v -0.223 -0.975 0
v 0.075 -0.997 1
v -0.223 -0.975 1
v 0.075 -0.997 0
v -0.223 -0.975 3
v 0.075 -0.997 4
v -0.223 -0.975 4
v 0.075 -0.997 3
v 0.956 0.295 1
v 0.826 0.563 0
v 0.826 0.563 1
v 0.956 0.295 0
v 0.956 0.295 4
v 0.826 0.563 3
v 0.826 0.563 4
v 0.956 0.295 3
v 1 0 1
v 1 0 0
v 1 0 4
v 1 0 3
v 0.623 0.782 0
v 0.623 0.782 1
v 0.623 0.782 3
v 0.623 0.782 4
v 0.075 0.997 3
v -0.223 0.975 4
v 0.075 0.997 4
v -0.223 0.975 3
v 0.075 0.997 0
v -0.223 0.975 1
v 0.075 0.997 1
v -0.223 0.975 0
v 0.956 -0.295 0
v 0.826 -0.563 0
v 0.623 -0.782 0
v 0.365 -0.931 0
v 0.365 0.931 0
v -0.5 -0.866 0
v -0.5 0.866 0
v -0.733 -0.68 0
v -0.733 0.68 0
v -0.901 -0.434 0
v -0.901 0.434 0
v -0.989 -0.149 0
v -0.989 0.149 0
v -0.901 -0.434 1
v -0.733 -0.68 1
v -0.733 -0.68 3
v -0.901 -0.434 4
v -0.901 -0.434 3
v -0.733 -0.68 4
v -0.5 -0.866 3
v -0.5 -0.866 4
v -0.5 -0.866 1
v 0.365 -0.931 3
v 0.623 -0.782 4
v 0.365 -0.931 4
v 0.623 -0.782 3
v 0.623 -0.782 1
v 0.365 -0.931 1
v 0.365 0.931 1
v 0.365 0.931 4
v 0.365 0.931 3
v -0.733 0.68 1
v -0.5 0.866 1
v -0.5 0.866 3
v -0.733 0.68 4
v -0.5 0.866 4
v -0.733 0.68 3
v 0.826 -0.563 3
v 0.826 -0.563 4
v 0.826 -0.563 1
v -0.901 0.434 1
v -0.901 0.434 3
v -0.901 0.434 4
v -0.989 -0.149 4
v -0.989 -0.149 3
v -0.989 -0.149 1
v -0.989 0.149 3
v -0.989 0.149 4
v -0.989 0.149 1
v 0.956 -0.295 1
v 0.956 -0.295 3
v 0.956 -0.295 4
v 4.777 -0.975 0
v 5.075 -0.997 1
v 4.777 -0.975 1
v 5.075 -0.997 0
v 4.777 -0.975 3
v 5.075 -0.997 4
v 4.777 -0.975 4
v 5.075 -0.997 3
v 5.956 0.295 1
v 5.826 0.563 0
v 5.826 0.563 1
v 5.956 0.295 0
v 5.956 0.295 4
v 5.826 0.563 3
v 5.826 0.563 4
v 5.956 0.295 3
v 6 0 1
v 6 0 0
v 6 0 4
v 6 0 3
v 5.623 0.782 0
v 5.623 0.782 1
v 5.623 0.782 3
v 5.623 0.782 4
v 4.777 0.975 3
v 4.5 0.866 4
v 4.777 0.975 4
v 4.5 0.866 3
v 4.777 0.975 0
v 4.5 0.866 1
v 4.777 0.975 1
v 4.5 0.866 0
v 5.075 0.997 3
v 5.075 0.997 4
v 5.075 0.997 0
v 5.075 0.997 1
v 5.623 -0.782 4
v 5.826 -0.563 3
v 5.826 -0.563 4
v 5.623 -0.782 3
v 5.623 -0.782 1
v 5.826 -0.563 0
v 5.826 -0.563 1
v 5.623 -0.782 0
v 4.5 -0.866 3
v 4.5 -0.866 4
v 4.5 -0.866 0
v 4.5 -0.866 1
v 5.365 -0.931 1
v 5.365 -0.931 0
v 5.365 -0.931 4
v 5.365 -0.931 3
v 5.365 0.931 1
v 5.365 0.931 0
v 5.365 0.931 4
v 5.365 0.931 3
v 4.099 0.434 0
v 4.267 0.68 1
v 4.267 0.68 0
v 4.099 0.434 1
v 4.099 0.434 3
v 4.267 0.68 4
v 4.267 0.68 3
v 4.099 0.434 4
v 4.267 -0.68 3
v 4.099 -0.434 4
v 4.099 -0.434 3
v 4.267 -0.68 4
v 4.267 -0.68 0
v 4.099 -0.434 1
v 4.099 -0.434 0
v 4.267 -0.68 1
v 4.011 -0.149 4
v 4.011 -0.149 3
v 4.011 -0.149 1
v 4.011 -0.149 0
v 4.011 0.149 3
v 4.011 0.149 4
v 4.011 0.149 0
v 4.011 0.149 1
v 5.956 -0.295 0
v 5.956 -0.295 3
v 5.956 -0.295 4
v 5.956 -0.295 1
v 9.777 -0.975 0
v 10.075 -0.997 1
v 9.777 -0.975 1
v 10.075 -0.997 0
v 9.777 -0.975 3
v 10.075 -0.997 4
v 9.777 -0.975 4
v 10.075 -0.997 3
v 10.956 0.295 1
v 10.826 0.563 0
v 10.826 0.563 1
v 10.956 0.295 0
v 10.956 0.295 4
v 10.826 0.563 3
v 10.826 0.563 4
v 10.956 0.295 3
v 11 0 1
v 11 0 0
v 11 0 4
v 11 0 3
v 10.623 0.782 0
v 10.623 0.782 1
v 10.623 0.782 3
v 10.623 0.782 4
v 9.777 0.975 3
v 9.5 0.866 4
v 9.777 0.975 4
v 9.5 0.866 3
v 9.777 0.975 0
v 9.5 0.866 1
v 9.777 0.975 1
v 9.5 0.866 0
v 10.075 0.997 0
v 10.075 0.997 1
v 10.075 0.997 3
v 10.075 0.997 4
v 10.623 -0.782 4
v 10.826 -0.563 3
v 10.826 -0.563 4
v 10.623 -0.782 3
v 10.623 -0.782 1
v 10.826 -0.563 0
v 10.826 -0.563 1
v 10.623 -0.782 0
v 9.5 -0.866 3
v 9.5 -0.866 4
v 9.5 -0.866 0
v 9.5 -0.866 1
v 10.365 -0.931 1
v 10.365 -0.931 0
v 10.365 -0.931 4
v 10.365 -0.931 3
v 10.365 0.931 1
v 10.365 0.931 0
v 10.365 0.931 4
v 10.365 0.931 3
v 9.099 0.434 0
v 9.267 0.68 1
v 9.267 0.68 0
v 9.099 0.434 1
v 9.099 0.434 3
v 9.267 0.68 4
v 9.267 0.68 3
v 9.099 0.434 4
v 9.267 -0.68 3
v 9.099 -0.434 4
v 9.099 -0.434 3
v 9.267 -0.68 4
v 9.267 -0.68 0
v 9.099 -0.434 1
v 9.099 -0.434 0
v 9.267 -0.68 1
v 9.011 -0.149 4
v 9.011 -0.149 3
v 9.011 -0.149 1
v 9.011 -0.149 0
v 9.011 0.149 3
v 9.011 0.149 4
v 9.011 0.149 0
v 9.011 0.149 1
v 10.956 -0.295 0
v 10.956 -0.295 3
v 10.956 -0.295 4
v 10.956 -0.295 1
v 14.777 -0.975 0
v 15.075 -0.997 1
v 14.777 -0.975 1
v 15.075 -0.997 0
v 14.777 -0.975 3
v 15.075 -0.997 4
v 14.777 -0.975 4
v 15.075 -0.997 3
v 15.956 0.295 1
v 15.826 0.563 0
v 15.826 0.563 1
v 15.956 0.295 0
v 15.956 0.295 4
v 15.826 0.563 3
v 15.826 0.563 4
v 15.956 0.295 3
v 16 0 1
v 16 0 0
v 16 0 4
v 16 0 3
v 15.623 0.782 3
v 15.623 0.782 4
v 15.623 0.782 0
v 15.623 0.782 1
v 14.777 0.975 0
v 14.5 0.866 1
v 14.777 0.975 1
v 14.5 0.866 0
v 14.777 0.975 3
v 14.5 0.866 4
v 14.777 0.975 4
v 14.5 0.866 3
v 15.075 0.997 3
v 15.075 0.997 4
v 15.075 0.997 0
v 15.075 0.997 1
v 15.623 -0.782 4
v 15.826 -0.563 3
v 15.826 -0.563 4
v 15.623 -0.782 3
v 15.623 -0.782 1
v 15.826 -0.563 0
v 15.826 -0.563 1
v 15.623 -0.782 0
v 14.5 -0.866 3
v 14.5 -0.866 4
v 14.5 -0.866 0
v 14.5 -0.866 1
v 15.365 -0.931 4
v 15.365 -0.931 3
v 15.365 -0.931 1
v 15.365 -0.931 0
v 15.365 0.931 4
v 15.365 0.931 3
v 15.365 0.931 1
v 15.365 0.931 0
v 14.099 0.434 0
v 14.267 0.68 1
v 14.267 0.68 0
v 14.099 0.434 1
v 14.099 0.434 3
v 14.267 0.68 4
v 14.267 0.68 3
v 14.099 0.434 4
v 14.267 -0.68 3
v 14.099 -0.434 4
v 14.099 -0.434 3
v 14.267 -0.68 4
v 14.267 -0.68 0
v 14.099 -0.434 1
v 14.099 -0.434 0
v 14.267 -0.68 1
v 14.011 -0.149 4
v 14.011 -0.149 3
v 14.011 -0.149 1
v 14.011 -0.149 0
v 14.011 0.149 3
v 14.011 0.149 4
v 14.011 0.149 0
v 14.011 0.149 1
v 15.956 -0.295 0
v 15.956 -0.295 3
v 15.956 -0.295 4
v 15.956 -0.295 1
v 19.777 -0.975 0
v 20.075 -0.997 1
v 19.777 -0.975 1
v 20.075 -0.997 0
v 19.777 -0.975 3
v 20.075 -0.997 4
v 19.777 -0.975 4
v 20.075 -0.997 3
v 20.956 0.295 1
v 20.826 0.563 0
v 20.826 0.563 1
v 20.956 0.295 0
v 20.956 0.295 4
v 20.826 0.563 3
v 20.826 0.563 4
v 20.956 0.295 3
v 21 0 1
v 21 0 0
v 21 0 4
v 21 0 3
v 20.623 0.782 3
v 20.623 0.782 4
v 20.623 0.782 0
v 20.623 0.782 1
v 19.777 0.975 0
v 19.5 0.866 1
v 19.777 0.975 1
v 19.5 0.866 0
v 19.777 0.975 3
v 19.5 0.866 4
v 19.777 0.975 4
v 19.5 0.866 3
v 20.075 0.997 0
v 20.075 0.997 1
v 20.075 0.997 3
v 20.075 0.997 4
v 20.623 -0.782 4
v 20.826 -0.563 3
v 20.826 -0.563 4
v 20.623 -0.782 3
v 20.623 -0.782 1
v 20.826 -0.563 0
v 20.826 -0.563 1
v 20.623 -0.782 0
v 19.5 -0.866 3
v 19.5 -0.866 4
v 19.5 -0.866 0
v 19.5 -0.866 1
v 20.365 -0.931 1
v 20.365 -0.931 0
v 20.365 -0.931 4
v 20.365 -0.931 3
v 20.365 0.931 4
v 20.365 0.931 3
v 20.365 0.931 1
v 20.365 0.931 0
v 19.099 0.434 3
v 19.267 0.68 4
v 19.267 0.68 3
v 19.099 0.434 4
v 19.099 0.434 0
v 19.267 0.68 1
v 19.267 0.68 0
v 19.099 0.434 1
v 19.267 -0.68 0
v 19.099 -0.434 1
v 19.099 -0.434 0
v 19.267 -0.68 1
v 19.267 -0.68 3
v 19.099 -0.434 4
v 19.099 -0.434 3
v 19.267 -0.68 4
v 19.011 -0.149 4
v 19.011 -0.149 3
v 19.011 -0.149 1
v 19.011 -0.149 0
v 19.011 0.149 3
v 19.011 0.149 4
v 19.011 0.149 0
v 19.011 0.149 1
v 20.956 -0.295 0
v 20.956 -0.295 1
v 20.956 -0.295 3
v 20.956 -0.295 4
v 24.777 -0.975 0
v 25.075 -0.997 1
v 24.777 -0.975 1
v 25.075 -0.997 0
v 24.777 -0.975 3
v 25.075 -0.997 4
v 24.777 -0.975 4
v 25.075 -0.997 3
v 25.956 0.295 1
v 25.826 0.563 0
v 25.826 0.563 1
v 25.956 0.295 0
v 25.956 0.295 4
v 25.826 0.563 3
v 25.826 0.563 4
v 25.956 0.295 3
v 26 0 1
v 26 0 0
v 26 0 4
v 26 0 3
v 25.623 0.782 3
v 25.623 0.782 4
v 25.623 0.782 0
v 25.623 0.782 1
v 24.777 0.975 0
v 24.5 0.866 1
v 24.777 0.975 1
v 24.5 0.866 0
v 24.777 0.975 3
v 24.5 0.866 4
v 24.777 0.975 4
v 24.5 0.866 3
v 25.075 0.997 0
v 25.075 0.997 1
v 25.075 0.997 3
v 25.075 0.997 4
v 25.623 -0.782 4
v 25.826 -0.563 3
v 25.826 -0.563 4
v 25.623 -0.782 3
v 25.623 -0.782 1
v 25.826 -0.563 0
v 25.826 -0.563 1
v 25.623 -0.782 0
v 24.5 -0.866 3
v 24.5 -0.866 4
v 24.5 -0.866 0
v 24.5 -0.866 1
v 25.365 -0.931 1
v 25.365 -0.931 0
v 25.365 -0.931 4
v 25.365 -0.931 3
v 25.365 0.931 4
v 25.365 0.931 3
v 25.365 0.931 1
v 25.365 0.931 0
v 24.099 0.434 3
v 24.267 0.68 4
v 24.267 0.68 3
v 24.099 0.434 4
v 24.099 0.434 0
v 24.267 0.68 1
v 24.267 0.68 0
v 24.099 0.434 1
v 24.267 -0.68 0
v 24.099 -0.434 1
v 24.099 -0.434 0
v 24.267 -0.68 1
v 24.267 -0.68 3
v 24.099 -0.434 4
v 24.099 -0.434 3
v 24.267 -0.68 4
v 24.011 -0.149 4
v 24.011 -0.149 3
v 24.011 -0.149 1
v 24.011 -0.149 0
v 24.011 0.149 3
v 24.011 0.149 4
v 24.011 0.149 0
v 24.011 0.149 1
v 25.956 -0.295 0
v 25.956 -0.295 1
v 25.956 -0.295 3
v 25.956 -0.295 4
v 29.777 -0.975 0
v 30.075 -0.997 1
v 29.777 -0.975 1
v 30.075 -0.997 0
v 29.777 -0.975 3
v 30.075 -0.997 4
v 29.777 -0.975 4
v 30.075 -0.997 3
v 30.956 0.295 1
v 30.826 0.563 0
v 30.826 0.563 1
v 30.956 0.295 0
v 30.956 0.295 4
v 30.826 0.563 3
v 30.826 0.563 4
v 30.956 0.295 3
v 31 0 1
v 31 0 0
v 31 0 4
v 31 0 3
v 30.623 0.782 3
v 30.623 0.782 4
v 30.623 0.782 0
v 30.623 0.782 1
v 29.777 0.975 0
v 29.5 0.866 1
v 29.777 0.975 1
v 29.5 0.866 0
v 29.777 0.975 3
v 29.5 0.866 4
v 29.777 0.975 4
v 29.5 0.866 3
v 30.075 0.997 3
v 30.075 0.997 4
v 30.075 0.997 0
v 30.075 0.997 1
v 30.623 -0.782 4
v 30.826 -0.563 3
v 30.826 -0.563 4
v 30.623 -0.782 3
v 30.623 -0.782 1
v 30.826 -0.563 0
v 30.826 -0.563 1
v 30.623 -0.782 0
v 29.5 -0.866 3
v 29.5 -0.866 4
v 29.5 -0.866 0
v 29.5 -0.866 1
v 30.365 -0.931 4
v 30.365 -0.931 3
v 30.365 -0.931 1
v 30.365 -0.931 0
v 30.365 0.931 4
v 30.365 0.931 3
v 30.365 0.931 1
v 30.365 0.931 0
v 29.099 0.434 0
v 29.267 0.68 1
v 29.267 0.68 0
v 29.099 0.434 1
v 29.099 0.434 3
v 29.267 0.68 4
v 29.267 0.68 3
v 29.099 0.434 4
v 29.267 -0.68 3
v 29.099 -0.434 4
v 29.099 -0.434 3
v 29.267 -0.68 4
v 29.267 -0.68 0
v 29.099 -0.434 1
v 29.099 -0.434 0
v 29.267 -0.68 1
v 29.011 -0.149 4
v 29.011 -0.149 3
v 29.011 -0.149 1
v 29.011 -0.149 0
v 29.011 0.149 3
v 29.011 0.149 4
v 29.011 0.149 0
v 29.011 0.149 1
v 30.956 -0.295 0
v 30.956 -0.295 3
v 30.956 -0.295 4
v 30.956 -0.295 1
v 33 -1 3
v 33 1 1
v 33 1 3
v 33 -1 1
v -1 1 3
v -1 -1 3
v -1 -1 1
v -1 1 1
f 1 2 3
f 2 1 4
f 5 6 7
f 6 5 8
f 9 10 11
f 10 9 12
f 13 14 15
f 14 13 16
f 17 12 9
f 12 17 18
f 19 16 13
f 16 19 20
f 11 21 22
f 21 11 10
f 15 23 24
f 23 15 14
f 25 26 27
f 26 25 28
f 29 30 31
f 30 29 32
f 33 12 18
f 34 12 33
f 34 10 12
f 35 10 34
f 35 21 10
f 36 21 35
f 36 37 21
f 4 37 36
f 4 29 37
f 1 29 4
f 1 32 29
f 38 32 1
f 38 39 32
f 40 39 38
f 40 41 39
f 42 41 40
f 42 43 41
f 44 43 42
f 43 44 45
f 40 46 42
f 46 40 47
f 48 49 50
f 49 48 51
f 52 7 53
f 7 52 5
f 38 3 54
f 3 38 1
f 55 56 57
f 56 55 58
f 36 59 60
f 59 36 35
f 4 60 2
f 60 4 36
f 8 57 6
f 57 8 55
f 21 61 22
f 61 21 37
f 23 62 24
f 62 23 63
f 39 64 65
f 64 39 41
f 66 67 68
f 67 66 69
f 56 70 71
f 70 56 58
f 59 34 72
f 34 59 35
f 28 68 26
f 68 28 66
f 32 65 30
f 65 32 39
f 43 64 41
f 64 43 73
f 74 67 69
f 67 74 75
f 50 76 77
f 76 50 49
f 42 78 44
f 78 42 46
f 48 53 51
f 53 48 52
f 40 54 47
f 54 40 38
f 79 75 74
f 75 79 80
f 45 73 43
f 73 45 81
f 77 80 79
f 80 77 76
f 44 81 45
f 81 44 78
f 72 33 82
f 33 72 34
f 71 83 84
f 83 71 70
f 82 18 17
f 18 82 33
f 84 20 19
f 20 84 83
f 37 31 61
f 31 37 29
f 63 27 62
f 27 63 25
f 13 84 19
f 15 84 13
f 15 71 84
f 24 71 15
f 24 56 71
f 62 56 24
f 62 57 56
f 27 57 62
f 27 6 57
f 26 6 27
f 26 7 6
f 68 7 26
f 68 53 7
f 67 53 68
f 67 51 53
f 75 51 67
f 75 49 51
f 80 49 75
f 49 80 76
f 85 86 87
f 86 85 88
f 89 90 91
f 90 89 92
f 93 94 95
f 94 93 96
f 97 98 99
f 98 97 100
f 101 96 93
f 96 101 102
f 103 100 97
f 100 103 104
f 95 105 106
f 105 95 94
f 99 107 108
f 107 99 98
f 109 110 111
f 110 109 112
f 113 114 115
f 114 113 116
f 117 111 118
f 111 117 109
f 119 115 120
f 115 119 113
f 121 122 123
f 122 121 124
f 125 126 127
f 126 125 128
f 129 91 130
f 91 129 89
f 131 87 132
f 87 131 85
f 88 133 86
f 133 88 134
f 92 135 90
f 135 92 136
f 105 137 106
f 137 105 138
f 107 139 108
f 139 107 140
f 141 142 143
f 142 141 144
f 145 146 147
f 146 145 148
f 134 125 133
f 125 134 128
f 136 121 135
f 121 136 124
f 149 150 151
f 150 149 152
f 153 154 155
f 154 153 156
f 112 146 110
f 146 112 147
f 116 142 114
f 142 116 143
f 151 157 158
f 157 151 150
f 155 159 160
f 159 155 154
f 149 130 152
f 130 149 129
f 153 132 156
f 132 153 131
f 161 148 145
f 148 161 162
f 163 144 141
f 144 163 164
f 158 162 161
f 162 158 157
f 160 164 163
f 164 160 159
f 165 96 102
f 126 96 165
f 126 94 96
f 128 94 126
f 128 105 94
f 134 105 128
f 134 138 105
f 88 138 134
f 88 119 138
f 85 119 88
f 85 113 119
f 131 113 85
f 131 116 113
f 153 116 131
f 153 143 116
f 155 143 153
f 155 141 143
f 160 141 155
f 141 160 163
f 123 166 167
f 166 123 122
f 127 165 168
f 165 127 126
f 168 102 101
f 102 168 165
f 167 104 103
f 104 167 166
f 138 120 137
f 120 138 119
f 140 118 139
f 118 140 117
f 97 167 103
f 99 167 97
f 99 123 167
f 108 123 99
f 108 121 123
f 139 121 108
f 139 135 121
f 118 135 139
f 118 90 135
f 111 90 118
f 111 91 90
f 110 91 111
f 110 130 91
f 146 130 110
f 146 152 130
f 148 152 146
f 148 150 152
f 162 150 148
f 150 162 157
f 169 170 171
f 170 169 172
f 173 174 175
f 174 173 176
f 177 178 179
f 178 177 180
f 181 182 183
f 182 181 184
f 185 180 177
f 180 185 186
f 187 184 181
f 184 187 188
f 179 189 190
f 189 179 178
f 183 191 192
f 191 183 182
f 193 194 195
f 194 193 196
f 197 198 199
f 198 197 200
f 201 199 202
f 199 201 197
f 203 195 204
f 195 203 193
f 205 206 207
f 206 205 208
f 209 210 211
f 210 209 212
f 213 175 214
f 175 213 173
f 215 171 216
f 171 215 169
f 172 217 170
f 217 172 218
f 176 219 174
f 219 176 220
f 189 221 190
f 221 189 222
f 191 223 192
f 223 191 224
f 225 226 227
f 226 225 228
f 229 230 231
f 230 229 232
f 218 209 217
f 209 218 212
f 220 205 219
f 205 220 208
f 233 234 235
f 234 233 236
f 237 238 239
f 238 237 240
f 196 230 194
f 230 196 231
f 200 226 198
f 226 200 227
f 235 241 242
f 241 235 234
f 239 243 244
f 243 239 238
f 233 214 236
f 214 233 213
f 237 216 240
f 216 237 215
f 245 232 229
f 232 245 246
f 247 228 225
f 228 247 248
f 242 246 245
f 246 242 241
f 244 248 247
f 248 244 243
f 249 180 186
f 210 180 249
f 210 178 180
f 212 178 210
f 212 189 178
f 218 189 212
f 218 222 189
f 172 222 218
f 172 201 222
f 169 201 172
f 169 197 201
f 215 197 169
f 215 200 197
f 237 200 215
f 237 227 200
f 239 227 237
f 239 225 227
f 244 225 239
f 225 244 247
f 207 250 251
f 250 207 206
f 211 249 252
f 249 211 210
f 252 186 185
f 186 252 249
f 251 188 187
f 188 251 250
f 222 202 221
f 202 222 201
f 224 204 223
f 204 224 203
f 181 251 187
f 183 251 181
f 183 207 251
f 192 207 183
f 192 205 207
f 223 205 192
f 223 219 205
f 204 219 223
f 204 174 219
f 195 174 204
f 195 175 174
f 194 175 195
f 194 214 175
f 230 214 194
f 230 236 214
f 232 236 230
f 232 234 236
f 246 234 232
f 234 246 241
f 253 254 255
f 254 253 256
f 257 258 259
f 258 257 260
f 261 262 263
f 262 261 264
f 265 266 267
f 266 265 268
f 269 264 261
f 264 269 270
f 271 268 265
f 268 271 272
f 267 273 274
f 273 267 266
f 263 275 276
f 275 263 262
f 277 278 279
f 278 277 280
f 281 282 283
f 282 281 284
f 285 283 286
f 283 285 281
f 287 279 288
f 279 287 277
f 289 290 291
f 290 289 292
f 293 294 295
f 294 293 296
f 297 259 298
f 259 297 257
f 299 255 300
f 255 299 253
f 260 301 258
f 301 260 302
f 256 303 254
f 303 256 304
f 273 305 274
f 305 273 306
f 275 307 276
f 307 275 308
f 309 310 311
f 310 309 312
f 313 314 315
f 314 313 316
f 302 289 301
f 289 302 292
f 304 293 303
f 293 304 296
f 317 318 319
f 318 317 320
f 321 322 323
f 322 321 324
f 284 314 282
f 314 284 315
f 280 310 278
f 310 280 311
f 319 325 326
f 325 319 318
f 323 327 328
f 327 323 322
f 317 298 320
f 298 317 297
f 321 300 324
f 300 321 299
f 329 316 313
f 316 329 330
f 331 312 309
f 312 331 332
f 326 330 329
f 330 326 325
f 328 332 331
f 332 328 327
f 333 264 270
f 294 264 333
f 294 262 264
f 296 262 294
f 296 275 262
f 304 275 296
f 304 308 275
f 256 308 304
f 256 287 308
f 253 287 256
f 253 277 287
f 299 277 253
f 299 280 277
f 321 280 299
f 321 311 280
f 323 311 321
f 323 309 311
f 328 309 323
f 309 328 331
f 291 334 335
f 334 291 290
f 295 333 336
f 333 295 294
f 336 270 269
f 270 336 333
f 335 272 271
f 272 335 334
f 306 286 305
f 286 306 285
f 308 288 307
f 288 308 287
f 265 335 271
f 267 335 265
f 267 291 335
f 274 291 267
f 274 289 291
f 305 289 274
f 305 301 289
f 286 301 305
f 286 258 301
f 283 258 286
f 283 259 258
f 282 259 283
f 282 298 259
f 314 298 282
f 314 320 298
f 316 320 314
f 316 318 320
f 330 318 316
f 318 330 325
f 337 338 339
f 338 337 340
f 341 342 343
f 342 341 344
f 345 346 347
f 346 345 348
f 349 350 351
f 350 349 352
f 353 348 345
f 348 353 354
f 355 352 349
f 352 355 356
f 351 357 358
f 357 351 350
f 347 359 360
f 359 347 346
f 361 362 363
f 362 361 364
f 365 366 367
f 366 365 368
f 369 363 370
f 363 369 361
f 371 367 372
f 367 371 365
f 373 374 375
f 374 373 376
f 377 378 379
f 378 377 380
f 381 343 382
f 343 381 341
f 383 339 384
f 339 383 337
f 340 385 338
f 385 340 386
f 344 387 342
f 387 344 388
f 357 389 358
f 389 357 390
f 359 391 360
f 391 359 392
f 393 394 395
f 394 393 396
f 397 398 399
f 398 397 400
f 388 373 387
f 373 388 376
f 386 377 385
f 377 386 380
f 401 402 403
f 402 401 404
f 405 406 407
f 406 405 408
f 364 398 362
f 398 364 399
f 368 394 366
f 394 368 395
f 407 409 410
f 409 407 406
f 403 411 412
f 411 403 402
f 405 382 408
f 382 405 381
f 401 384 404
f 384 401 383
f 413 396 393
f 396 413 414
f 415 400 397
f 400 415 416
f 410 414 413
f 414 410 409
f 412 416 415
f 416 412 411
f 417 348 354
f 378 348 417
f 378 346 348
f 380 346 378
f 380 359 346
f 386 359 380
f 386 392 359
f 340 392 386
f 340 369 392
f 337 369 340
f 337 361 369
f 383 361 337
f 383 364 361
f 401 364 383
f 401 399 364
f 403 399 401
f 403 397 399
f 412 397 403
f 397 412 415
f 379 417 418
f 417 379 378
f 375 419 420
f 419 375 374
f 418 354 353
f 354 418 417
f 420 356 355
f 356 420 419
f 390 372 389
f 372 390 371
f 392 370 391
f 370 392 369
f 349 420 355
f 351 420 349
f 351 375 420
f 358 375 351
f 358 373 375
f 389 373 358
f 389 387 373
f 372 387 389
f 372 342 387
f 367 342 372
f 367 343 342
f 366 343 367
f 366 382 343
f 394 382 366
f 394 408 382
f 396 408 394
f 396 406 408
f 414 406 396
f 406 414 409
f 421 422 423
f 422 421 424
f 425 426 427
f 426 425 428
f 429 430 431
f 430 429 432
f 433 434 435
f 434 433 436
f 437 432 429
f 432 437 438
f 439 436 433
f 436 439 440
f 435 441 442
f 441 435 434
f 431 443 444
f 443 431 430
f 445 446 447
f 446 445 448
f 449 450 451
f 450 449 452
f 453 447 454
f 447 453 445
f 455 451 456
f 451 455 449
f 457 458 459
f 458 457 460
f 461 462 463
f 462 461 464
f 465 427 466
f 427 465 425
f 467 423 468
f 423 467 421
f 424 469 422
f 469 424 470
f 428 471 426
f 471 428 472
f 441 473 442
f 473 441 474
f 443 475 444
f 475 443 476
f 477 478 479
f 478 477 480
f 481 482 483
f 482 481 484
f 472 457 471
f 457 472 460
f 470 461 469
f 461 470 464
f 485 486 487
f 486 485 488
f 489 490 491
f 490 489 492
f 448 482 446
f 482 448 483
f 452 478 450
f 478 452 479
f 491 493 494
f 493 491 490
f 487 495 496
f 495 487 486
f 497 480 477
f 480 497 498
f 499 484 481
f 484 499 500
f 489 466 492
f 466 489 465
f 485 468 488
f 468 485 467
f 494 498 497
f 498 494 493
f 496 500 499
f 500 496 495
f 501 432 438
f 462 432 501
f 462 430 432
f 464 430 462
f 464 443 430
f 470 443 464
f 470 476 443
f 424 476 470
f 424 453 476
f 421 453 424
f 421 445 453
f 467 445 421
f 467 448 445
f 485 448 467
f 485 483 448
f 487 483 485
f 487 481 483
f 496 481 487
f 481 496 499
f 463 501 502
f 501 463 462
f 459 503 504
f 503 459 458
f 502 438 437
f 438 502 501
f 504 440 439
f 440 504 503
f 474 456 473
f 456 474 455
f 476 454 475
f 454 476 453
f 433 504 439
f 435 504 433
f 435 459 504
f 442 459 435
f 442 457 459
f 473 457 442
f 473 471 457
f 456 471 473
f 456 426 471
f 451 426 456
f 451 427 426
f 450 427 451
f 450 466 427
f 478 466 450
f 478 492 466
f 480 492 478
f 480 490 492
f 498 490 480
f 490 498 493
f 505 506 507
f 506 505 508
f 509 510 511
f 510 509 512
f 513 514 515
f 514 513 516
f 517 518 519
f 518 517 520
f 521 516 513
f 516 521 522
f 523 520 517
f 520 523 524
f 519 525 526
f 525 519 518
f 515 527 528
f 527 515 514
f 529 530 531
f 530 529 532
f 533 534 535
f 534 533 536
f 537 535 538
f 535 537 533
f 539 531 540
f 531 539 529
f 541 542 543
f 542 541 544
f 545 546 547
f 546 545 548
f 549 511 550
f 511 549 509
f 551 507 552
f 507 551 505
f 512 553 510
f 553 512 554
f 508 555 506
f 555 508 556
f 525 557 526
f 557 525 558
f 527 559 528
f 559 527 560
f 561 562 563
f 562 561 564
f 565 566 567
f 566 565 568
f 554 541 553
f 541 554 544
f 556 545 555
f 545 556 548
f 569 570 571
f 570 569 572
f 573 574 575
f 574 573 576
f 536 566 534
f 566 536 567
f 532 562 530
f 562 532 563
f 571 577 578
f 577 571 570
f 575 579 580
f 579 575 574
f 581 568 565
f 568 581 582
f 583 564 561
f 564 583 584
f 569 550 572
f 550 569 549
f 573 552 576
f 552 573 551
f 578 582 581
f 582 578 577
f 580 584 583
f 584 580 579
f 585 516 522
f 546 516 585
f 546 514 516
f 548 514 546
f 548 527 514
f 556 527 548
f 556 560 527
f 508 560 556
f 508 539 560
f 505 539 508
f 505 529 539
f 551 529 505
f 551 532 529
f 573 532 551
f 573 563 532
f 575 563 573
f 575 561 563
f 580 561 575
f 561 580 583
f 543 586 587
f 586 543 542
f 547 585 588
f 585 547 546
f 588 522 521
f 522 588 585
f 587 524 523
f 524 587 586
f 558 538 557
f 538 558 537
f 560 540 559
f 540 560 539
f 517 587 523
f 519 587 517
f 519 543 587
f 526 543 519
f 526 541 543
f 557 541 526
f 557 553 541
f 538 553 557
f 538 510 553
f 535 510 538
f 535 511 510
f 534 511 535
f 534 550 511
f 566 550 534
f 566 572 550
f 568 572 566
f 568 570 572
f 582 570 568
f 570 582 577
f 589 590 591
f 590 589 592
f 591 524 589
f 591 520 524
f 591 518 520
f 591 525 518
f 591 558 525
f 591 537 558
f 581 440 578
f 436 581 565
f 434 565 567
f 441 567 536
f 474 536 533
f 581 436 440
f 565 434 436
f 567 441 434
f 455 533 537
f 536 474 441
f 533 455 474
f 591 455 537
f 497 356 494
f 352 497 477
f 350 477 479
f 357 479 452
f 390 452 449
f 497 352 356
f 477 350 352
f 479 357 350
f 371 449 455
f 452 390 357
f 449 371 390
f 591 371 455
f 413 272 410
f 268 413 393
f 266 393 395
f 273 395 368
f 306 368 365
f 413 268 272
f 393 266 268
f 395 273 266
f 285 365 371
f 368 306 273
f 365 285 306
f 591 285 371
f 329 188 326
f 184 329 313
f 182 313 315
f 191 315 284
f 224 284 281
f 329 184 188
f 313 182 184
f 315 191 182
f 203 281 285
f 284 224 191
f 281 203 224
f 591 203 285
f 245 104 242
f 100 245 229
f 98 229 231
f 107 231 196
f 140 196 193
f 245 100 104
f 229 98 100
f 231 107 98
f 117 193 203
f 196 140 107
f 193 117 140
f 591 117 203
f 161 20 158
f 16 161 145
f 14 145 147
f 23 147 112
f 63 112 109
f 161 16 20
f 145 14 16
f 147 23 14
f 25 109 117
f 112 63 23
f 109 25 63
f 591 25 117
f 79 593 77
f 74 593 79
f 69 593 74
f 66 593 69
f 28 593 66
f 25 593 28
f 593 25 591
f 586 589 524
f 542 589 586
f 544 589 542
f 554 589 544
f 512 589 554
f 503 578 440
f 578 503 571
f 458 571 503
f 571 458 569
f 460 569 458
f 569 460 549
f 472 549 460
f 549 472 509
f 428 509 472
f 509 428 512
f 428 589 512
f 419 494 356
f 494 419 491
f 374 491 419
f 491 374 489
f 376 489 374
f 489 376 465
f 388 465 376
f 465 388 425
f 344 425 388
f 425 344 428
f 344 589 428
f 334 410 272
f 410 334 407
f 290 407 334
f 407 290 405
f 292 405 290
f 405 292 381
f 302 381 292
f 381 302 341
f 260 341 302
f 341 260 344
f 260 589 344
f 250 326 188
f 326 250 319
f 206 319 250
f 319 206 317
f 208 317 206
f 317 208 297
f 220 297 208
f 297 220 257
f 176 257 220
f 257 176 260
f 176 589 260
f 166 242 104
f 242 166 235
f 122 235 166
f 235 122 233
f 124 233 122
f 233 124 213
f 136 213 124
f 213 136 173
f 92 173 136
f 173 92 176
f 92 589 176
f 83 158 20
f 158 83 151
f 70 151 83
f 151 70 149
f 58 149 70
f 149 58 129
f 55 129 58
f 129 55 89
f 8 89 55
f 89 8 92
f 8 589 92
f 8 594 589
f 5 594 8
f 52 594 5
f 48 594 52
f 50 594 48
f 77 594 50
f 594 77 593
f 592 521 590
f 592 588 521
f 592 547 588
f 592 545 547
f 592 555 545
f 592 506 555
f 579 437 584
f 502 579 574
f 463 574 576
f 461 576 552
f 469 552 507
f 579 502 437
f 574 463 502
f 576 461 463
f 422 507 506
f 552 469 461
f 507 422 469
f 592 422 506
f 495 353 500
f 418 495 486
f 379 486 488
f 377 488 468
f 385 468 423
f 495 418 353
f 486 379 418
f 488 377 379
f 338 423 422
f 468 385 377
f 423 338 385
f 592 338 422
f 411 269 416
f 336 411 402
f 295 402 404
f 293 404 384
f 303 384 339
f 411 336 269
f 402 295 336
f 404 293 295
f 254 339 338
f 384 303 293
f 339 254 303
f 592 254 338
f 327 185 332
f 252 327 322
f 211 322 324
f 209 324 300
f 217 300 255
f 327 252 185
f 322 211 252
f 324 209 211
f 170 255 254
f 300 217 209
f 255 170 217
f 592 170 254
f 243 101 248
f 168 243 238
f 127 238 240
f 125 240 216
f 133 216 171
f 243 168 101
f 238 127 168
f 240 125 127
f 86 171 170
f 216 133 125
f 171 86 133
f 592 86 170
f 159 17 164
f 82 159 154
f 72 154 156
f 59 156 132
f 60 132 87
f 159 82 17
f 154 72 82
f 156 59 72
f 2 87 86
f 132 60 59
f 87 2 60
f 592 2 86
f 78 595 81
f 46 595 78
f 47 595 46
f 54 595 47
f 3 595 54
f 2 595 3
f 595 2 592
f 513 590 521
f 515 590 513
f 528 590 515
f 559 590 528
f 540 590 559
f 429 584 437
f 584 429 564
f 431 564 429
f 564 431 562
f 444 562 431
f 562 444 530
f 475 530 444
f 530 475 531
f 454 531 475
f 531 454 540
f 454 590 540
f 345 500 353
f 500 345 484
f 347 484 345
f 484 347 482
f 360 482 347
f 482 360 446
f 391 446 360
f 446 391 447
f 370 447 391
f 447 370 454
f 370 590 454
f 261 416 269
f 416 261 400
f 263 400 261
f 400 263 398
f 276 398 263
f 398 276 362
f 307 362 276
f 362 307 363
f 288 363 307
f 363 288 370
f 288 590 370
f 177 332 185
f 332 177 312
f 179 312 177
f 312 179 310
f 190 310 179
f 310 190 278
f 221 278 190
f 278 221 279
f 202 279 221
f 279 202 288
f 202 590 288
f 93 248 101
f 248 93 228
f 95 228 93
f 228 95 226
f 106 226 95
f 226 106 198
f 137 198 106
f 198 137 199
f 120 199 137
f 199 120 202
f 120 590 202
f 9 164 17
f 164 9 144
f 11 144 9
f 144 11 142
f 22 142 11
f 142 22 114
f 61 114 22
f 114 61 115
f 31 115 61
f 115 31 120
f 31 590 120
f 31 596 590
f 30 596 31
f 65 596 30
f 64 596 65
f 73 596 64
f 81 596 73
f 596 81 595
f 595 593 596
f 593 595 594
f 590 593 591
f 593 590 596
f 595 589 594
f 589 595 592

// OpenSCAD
$fa = 1;
$fs = 0.3;

for(x = [0:5:30]) {
	translate([x, 0, 0]) {
		cylinder(r=1, h=4);
	}
}
translate([-1, -1, 1]) {
	cube([34, 2, 2]);
}
